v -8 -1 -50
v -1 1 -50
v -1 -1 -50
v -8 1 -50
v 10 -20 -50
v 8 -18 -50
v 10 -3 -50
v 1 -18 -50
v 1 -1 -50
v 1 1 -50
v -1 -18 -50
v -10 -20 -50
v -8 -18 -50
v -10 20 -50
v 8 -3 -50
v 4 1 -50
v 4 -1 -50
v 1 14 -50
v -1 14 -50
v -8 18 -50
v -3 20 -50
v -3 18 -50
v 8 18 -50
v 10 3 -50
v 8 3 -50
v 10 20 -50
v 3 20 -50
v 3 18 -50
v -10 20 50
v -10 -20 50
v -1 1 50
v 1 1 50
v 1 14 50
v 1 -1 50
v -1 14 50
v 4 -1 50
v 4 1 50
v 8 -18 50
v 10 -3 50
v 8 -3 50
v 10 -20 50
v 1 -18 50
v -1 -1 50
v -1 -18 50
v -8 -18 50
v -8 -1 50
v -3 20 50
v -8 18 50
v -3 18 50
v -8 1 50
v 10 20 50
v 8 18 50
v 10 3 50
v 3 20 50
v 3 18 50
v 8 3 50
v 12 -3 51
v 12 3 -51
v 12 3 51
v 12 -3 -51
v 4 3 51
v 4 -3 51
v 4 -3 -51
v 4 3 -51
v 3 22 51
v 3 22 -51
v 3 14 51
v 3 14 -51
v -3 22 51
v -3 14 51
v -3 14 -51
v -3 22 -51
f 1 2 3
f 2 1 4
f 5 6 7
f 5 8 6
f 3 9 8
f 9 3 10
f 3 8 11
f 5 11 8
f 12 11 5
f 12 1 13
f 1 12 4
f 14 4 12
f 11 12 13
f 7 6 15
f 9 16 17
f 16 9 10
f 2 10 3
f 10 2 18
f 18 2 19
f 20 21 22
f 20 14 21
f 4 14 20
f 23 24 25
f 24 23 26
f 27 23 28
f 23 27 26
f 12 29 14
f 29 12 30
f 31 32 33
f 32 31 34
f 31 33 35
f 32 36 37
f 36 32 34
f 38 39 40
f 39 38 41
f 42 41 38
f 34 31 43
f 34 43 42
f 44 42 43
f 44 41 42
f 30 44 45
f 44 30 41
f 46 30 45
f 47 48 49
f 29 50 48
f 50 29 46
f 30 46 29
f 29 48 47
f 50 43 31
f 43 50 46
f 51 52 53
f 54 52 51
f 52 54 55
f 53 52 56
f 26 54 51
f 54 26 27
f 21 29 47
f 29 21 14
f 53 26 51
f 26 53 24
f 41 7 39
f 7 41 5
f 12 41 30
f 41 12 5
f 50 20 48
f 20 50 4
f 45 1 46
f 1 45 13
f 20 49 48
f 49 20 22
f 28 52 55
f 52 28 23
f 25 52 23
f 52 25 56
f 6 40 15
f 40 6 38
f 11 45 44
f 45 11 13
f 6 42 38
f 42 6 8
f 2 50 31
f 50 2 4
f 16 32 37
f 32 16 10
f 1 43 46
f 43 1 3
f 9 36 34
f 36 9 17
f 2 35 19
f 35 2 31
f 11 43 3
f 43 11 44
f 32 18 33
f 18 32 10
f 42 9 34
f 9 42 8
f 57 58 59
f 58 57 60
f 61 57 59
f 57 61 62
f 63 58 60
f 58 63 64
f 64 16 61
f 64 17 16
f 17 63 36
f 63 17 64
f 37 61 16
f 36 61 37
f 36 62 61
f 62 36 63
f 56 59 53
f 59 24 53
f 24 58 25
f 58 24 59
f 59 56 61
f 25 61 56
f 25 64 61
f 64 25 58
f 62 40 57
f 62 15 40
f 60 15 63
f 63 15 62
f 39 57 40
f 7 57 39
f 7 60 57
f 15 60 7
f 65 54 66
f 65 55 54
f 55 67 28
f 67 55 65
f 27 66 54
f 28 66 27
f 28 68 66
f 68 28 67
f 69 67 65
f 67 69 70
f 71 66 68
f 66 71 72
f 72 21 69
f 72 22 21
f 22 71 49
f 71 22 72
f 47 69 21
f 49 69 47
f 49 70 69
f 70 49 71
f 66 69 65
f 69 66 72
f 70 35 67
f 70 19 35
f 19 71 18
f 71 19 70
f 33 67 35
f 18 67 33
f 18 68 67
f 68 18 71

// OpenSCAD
// Parameters
cross_section_width_mm = 20; //[10:40:1]
cross_section_height_mm = 40; //[20:80:1]
length_mm = 100; //[50:200:1]
wall_thickness_mm = 2; //[1:4:0.25]
slot_opening_width_mm = 6; //[4:8:0.25]
slot_depth_mm = 6; //[4:10:0.25]
slot_neck_width_mm = 10; //[8:14:0.25]
center_bore_diameter_mm = 6; //[0:10:0.25]
web_thickness_mm = 2; //[1:4:0.25]
overlap_mm = 1; //[0.5:2:0.1]

// Extrusion - complete geometry
module extrusion() {
  color("Silver") {
    difference() {
      linear_extrude(height=length_mm, center=true) {
        square([cross_section_width_mm, cross_section_height_mm], center=true);
      }
      translate([0, 0, 0])
        linear_extrude(height=length_mm + 2*overlap_mm, center=true) {
          square([cross_section_width_mm - 2*wall_thickness_mm, cross_section_height_mm - 2*wall_thickness_mm], center=true);
        }
    }
  }
}

// Extrusion Cross Section - complete geometry
module extrusion_cross_section() {
  color("DimGray") {
    union() {
      linear_extrude(height=length_mm, center=true) {
        square([cross_section_width_mm - 2*wall_thickness_mm + 2*overlap_mm, web_thickness_mm], center=true);
      }
      linear_extrude(height=length_mm, center=true) {
        square([web_thickness_mm, cross_section_height_mm - 2*wall_thickness_mm + 2*overlap_mm], center=true);
      }
    }
  }
}

// Box Corner Profile Section - complete geometry
module box_corner_profile_section() {
  color("Black") {
    difference() {
      cube([slot_depth_mm + 2*overlap_mm, slot_opening_width_mm, length_mm + 2*overlap_mm], center=true);
      translate([cross_section_width_mm/2 - slot_depth_mm/2 + overlap_mm, 0, 0])
        cube([slot_depth_mm + 2*overlap_mm, slot_neck_width_mm, length_mm + 2*overlap_mm], center=true);
    }
  }
}

// Box Corner Profile Sections - complete geometry
module box_corner_profile_sections() {
  color("Black") {
    difference() {
      cube([slot_opening_width_mm, slot_depth_mm + 2*overlap_mm, length_mm + 2*overlap_mm], center=true);
      translate([0, cross_section_height_mm/2 - slot_depth_mm/2 + overlap_mm, 0])
        cube([slot_neck_width_mm, slot_depth_mm + 2*overlap_mm, length_mm + 2*overlap_mm], center=true);
    }
  }
}

// Assembly
module assembly() {
  extrusion();
  extrusion_cross_section();
  translate([cross_section_width_mm/2 - slot_depth_mm/2 + overlap_mm, 0, 0]) box_corner_profile_section();
  translate([0, cross_section_height_mm/2 - slot_depth_mm/2 + overlap_mm, 0]) box_corner_profile_sections();
}

assembly();
